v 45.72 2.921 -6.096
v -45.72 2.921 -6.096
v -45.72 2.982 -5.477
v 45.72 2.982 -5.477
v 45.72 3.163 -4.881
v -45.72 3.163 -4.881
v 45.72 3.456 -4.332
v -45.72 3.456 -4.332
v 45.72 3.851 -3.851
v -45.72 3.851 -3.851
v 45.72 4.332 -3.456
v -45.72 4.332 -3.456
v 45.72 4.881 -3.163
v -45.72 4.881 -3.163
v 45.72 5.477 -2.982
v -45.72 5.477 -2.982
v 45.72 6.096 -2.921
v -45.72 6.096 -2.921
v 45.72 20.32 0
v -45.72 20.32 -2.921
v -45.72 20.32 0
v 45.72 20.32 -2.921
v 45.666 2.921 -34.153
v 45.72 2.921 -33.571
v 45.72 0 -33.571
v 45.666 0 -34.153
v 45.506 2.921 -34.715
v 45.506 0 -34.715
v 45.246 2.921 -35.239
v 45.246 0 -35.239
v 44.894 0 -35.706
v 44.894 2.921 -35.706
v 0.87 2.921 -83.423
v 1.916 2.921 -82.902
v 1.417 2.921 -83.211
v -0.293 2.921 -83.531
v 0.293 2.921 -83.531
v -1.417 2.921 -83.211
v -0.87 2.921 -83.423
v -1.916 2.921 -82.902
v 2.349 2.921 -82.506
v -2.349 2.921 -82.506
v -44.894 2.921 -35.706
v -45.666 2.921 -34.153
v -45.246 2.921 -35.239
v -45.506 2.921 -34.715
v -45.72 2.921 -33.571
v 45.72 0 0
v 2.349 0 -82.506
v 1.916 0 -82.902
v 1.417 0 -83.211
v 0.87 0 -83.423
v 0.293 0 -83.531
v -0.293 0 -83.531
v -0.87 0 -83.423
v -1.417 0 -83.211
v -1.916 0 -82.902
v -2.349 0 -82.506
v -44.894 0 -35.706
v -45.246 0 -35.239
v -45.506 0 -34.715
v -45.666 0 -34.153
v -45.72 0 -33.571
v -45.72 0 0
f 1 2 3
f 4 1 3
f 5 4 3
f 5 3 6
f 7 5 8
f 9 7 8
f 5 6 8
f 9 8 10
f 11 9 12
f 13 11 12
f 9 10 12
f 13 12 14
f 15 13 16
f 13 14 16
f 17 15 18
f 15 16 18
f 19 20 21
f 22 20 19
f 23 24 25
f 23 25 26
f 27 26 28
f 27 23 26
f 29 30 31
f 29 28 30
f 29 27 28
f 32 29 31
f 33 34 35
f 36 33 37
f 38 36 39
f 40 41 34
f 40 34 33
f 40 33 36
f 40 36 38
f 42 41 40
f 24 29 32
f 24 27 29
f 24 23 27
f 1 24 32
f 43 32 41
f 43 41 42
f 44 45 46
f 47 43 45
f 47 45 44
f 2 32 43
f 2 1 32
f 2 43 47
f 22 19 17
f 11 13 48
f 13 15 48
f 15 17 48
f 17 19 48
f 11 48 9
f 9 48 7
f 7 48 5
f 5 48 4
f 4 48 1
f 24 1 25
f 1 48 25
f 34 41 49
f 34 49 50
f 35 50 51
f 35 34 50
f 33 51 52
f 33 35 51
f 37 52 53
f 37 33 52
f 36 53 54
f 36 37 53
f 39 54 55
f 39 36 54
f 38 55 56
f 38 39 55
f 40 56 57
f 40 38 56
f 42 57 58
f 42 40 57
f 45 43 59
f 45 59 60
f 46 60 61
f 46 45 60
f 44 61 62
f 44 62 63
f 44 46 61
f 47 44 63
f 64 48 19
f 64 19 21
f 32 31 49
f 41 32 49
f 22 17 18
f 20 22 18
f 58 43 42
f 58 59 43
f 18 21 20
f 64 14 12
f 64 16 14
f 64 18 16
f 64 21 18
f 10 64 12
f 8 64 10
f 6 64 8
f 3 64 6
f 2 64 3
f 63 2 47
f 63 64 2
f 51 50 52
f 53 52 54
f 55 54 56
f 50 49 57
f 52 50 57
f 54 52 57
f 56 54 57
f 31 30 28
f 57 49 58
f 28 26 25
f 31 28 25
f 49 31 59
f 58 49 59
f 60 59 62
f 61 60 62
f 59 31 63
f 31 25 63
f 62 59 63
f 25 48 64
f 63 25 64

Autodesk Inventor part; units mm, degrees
ref_plane "YZ Plane" through (0, 0, 0) normal (1, 0, 0) x (0, 1, 0)
ref_plane "XZ Plane" through (0, 0, 0) normal (0, 1, 0) x (-1, 0, 0)
ref_plane "XY Plane" through (0, 0, 0) normal (0, 0, 1) x (1, 0, 0)
sketch "Sketch1" plane through (0, 0, 0) normal (0, 1, 0) x (-1, 0, 0)
  line L0 (0, 0) -> (45.72, 0)
  line L1 (45.72, 0) -> (45.72, -34.798)
  line L2 (45.72, -34.798) -> (0, -85.09)
  line L3 (0, -85.09) -> (0, 0) construction
  line L4 (0, 0) -> (-45.72, 0)
  line L5 (-45.72, 0) -> (-45.72, -34.798)
  line L6 (-45.72, -34.798) -> (0, -85.09)
  dimension "d0" = 45.72
  dimension "d1" = 85.09
  dimension "d2" = 34.798
extrude "Extrusion1" add sketch "Sketch1" along normal blind 2.921
sketch "Sketch3" plane through (0, 2.921, 0) normal (0, 1, 0) x (1, 0, 0)
  line L0 (-45.72, 0) -> (45.72, 0) projected
  line L1 (45.72, 0) -> (45.72, 34.798) projected
  line L2 (-45.72, 0) -> (45.72, 0)
  line L3 (45.72, 0) -> (45.72, 2.921)
  line L4 (45.72, 2.921) -> (-45.72, 2.921)
  line L5 (-45.72, 2.921) -> (-45.72, 0)
  point P0 (0, 0)
  dimension "d5" = 2.921
extrude "Extrusion2" add sketch "Sketch3" along normal blind 17.399
fillet "Fillet1" radius 3.175 1 edges at (0, 1.4605, -85.09)
fillet "Fillet2" radius 3.175 2 edges at (45.72, 1.4605, -34.798) (-45.72, 1.4605, -34.798)
fillet "Fillet3" radius 3.175 1 edges at (0, 2.921, -2.921)
properties part number "SnowBlowerMotorMount"
